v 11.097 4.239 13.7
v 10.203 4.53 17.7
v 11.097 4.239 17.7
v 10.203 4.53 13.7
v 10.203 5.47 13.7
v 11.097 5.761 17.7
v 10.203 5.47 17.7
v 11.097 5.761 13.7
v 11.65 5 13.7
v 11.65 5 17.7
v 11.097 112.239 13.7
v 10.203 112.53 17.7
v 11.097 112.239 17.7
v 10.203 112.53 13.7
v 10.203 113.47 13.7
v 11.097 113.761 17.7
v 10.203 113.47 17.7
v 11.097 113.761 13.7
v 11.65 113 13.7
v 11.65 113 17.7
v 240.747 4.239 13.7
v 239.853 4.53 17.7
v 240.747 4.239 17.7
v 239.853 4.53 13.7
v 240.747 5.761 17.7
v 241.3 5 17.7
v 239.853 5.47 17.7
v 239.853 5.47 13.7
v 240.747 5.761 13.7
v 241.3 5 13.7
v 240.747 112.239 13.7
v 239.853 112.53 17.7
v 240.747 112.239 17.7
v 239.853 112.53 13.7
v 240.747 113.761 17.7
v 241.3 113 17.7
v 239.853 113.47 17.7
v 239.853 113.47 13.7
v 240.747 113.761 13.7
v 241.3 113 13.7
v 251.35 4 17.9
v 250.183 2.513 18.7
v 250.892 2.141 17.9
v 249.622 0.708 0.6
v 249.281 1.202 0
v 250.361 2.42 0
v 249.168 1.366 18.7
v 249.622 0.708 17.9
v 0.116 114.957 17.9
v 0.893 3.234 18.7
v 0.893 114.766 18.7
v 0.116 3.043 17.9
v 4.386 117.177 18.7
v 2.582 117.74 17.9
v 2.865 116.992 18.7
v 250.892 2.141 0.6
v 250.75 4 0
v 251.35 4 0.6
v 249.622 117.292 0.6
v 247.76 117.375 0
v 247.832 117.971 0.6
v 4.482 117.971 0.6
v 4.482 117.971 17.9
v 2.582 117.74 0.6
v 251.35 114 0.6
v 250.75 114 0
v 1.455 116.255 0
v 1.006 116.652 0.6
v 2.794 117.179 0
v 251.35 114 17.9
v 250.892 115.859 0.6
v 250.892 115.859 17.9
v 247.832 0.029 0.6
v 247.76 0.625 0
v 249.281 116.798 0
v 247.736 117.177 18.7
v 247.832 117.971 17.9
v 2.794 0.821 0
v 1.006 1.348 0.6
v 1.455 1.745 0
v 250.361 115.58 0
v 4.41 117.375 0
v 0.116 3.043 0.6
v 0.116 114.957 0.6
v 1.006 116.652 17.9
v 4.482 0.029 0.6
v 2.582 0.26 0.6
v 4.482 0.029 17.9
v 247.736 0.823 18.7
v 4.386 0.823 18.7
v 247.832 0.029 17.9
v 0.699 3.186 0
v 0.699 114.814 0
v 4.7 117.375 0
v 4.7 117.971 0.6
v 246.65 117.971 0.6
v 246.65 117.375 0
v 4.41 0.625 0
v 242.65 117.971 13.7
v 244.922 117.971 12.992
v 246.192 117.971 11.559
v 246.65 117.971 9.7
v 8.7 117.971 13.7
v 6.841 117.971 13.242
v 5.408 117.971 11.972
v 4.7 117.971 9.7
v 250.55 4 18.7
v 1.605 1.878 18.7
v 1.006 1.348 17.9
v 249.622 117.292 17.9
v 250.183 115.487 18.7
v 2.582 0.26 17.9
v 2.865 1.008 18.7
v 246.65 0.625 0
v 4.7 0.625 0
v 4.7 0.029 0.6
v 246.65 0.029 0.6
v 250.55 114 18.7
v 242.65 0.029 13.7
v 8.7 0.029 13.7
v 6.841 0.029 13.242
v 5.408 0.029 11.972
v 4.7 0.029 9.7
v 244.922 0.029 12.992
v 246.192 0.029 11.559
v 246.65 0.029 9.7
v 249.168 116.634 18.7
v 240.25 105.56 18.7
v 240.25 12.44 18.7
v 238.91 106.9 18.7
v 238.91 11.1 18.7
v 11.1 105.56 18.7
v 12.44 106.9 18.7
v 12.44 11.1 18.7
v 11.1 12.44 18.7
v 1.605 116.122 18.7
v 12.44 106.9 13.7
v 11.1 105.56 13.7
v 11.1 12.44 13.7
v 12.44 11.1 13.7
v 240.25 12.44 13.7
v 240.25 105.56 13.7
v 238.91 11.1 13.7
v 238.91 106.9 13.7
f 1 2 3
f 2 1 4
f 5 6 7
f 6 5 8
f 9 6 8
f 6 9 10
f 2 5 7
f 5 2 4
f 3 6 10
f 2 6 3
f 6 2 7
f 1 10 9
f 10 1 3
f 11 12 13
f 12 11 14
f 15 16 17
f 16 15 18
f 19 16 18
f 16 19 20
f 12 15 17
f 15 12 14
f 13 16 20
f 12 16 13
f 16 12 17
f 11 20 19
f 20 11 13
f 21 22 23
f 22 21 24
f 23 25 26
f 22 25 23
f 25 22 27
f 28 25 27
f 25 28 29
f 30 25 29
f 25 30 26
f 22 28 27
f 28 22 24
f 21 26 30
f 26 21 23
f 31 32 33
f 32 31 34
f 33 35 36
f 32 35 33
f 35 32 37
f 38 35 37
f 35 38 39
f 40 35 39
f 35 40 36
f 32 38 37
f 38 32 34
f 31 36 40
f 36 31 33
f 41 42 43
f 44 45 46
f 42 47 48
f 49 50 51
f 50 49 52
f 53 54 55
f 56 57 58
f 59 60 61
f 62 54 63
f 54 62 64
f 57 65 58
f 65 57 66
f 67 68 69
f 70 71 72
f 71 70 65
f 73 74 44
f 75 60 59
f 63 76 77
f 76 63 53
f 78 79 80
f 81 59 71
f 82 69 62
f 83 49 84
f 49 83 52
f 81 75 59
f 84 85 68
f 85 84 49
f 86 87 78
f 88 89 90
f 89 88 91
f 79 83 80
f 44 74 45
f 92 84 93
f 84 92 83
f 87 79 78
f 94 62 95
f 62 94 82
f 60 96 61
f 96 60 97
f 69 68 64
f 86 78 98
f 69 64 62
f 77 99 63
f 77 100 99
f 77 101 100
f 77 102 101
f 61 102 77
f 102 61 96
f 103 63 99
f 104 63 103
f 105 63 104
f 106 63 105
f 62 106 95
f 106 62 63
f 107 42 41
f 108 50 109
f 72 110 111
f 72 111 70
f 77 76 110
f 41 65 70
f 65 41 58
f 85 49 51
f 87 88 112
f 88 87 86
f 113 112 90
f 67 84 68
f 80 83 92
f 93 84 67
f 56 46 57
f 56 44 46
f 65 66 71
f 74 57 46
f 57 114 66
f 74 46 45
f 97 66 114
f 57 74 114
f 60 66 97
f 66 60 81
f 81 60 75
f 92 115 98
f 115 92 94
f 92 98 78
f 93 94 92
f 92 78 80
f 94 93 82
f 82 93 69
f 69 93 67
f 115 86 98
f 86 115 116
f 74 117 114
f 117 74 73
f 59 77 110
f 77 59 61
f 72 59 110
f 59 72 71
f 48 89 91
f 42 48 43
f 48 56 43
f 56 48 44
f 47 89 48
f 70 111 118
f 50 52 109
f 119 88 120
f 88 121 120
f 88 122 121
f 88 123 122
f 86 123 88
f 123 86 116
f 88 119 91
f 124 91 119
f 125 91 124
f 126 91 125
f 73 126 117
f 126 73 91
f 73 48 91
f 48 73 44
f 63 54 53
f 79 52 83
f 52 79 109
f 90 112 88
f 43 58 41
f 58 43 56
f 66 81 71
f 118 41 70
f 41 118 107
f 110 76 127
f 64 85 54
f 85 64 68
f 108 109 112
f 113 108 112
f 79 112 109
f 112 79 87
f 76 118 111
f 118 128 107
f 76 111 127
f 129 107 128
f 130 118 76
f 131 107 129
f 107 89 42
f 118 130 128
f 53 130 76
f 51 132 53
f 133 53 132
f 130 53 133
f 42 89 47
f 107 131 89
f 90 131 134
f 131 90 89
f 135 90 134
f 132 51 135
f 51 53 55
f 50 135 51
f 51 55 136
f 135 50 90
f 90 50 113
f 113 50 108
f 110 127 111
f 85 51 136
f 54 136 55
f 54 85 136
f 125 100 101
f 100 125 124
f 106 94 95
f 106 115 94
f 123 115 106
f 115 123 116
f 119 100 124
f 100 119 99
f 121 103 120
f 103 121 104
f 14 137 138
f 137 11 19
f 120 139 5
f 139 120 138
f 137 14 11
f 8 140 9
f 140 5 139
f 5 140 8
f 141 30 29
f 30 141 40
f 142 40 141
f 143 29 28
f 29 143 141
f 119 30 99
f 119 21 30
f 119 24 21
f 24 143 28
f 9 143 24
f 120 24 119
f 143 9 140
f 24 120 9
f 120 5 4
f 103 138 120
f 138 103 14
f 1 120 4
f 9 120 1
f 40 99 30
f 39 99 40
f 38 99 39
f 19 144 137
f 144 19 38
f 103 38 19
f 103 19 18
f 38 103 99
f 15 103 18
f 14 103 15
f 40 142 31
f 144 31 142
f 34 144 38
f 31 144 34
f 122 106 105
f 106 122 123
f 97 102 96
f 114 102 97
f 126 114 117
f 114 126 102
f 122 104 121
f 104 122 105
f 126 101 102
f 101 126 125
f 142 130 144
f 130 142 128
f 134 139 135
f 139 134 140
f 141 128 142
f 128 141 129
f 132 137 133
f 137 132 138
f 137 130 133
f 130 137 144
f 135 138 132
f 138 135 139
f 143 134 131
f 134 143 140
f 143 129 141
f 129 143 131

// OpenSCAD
// file: rounded_rect.scad
module rounded_rect(size, r) {
  r = min(size[0] / 2, size[1] / 2, r);

  w = size[0] - 2 * r;
  h = size[1] - 2 * r;
  tol = 1e-6;
  if (w > tol && h > tol) {
    offset(r = r)
      translate([r, r])
        square([w, h]);
  } else if (w > tol || h > tol) {
    hull() {
      translate([r, r]) circle(r = r);
      translate([r + max(w, 0), r + max(h, 0)]) circle(r = r);
    }
  } else {
    translate([r, r]) circle(r = r);
  }
}

module rounded_rect_prism(size, r, convexity = 10) {
  linear_extrude(height = size[2], convexity = convexity) {
    rounded_rect([size[0], size[1]], r);
  }
}

module half_rounded_rect(size, r) {
  intersection() {
    offset(r = r)
      translate([r, -r])
        square([size[0] - 2 * r, size[1]]);
    square(size);
  }
}

module half_rounded_rect_prism(size, r, convexity = 10) {
  linear_extrude(height = size[2], convexity = convexity) {
    half_rounded_rect([size[0], size[1]], r);
  }
}
// main file
include <spec.scad>;
use <rounded_rect.scad>;

module case_top_cover() {
  color("yellow") {
    difference() {
      case_top_cover_outer();

      // Bottom tub
      bottom_tub_cutout();
      // Frame insides
      translate([case_top_wall_thickness, case_top_wall_thickness, case_tub_height - eps]) {
        rounded_rect_prism(
          size = [case_top_inner_width, case_top_inner_depth, case_top_height + 2 * eps],
          r = case_top_inner_radius
        );
      }
      // Screw holes
      for (screw_x = [screw_length_inset, case_width - screw_length_inset]) {
        for (screw_y = [screw_depth_inset, case_depth - screw_depth_inset]) {
          translate([screw_x, screw_y, case_tub_height - eps]) {
            screw_tap_hole();
          }
        }
      }
    }
  }
}

module case_top_cover_outer() {
  hull() {
    r = case_corner_outer_radius;
    for (x = [r, case_width - r], y = [r, case_depth - r]) {
      translate([x, y, 0]) {
        cylinder(h = case_floor_chamfer, r1 = r - case_floor_chamfer, r2 = r);
        translate([0, 0, case_floor_chamfer])
          cylinder(h = case_height - case_floor_chamfer - case_top_chamfer, r = r);
        translate([0, 0, case_height - case_top_chamfer])
          cylinder(h = case_top_chamfer, r1 = r, r2 = r - case_top_chamfer);
      }
    }
  }
}

module bottom_tub_cutout() {
  translate([case_top_skirt_thickness, -eps, -eps]) {
    rotate([90, 0, 0]) {
      mirror([0, 0, 1]) {
        half_rounded_rect_prism(
          size = [case_width - 2 * case_top_skirt_thickness, case_tub_height + eps, case_depth + 2 * eps],
          r = case_seam_radius
        );
      }
    }
  }
}

module screw_tap_hole() {
  cylinder(h = screw_tap_hole_length + eps, r = screw_tap_drill_diameter / 2);
}

case_top_cover();
